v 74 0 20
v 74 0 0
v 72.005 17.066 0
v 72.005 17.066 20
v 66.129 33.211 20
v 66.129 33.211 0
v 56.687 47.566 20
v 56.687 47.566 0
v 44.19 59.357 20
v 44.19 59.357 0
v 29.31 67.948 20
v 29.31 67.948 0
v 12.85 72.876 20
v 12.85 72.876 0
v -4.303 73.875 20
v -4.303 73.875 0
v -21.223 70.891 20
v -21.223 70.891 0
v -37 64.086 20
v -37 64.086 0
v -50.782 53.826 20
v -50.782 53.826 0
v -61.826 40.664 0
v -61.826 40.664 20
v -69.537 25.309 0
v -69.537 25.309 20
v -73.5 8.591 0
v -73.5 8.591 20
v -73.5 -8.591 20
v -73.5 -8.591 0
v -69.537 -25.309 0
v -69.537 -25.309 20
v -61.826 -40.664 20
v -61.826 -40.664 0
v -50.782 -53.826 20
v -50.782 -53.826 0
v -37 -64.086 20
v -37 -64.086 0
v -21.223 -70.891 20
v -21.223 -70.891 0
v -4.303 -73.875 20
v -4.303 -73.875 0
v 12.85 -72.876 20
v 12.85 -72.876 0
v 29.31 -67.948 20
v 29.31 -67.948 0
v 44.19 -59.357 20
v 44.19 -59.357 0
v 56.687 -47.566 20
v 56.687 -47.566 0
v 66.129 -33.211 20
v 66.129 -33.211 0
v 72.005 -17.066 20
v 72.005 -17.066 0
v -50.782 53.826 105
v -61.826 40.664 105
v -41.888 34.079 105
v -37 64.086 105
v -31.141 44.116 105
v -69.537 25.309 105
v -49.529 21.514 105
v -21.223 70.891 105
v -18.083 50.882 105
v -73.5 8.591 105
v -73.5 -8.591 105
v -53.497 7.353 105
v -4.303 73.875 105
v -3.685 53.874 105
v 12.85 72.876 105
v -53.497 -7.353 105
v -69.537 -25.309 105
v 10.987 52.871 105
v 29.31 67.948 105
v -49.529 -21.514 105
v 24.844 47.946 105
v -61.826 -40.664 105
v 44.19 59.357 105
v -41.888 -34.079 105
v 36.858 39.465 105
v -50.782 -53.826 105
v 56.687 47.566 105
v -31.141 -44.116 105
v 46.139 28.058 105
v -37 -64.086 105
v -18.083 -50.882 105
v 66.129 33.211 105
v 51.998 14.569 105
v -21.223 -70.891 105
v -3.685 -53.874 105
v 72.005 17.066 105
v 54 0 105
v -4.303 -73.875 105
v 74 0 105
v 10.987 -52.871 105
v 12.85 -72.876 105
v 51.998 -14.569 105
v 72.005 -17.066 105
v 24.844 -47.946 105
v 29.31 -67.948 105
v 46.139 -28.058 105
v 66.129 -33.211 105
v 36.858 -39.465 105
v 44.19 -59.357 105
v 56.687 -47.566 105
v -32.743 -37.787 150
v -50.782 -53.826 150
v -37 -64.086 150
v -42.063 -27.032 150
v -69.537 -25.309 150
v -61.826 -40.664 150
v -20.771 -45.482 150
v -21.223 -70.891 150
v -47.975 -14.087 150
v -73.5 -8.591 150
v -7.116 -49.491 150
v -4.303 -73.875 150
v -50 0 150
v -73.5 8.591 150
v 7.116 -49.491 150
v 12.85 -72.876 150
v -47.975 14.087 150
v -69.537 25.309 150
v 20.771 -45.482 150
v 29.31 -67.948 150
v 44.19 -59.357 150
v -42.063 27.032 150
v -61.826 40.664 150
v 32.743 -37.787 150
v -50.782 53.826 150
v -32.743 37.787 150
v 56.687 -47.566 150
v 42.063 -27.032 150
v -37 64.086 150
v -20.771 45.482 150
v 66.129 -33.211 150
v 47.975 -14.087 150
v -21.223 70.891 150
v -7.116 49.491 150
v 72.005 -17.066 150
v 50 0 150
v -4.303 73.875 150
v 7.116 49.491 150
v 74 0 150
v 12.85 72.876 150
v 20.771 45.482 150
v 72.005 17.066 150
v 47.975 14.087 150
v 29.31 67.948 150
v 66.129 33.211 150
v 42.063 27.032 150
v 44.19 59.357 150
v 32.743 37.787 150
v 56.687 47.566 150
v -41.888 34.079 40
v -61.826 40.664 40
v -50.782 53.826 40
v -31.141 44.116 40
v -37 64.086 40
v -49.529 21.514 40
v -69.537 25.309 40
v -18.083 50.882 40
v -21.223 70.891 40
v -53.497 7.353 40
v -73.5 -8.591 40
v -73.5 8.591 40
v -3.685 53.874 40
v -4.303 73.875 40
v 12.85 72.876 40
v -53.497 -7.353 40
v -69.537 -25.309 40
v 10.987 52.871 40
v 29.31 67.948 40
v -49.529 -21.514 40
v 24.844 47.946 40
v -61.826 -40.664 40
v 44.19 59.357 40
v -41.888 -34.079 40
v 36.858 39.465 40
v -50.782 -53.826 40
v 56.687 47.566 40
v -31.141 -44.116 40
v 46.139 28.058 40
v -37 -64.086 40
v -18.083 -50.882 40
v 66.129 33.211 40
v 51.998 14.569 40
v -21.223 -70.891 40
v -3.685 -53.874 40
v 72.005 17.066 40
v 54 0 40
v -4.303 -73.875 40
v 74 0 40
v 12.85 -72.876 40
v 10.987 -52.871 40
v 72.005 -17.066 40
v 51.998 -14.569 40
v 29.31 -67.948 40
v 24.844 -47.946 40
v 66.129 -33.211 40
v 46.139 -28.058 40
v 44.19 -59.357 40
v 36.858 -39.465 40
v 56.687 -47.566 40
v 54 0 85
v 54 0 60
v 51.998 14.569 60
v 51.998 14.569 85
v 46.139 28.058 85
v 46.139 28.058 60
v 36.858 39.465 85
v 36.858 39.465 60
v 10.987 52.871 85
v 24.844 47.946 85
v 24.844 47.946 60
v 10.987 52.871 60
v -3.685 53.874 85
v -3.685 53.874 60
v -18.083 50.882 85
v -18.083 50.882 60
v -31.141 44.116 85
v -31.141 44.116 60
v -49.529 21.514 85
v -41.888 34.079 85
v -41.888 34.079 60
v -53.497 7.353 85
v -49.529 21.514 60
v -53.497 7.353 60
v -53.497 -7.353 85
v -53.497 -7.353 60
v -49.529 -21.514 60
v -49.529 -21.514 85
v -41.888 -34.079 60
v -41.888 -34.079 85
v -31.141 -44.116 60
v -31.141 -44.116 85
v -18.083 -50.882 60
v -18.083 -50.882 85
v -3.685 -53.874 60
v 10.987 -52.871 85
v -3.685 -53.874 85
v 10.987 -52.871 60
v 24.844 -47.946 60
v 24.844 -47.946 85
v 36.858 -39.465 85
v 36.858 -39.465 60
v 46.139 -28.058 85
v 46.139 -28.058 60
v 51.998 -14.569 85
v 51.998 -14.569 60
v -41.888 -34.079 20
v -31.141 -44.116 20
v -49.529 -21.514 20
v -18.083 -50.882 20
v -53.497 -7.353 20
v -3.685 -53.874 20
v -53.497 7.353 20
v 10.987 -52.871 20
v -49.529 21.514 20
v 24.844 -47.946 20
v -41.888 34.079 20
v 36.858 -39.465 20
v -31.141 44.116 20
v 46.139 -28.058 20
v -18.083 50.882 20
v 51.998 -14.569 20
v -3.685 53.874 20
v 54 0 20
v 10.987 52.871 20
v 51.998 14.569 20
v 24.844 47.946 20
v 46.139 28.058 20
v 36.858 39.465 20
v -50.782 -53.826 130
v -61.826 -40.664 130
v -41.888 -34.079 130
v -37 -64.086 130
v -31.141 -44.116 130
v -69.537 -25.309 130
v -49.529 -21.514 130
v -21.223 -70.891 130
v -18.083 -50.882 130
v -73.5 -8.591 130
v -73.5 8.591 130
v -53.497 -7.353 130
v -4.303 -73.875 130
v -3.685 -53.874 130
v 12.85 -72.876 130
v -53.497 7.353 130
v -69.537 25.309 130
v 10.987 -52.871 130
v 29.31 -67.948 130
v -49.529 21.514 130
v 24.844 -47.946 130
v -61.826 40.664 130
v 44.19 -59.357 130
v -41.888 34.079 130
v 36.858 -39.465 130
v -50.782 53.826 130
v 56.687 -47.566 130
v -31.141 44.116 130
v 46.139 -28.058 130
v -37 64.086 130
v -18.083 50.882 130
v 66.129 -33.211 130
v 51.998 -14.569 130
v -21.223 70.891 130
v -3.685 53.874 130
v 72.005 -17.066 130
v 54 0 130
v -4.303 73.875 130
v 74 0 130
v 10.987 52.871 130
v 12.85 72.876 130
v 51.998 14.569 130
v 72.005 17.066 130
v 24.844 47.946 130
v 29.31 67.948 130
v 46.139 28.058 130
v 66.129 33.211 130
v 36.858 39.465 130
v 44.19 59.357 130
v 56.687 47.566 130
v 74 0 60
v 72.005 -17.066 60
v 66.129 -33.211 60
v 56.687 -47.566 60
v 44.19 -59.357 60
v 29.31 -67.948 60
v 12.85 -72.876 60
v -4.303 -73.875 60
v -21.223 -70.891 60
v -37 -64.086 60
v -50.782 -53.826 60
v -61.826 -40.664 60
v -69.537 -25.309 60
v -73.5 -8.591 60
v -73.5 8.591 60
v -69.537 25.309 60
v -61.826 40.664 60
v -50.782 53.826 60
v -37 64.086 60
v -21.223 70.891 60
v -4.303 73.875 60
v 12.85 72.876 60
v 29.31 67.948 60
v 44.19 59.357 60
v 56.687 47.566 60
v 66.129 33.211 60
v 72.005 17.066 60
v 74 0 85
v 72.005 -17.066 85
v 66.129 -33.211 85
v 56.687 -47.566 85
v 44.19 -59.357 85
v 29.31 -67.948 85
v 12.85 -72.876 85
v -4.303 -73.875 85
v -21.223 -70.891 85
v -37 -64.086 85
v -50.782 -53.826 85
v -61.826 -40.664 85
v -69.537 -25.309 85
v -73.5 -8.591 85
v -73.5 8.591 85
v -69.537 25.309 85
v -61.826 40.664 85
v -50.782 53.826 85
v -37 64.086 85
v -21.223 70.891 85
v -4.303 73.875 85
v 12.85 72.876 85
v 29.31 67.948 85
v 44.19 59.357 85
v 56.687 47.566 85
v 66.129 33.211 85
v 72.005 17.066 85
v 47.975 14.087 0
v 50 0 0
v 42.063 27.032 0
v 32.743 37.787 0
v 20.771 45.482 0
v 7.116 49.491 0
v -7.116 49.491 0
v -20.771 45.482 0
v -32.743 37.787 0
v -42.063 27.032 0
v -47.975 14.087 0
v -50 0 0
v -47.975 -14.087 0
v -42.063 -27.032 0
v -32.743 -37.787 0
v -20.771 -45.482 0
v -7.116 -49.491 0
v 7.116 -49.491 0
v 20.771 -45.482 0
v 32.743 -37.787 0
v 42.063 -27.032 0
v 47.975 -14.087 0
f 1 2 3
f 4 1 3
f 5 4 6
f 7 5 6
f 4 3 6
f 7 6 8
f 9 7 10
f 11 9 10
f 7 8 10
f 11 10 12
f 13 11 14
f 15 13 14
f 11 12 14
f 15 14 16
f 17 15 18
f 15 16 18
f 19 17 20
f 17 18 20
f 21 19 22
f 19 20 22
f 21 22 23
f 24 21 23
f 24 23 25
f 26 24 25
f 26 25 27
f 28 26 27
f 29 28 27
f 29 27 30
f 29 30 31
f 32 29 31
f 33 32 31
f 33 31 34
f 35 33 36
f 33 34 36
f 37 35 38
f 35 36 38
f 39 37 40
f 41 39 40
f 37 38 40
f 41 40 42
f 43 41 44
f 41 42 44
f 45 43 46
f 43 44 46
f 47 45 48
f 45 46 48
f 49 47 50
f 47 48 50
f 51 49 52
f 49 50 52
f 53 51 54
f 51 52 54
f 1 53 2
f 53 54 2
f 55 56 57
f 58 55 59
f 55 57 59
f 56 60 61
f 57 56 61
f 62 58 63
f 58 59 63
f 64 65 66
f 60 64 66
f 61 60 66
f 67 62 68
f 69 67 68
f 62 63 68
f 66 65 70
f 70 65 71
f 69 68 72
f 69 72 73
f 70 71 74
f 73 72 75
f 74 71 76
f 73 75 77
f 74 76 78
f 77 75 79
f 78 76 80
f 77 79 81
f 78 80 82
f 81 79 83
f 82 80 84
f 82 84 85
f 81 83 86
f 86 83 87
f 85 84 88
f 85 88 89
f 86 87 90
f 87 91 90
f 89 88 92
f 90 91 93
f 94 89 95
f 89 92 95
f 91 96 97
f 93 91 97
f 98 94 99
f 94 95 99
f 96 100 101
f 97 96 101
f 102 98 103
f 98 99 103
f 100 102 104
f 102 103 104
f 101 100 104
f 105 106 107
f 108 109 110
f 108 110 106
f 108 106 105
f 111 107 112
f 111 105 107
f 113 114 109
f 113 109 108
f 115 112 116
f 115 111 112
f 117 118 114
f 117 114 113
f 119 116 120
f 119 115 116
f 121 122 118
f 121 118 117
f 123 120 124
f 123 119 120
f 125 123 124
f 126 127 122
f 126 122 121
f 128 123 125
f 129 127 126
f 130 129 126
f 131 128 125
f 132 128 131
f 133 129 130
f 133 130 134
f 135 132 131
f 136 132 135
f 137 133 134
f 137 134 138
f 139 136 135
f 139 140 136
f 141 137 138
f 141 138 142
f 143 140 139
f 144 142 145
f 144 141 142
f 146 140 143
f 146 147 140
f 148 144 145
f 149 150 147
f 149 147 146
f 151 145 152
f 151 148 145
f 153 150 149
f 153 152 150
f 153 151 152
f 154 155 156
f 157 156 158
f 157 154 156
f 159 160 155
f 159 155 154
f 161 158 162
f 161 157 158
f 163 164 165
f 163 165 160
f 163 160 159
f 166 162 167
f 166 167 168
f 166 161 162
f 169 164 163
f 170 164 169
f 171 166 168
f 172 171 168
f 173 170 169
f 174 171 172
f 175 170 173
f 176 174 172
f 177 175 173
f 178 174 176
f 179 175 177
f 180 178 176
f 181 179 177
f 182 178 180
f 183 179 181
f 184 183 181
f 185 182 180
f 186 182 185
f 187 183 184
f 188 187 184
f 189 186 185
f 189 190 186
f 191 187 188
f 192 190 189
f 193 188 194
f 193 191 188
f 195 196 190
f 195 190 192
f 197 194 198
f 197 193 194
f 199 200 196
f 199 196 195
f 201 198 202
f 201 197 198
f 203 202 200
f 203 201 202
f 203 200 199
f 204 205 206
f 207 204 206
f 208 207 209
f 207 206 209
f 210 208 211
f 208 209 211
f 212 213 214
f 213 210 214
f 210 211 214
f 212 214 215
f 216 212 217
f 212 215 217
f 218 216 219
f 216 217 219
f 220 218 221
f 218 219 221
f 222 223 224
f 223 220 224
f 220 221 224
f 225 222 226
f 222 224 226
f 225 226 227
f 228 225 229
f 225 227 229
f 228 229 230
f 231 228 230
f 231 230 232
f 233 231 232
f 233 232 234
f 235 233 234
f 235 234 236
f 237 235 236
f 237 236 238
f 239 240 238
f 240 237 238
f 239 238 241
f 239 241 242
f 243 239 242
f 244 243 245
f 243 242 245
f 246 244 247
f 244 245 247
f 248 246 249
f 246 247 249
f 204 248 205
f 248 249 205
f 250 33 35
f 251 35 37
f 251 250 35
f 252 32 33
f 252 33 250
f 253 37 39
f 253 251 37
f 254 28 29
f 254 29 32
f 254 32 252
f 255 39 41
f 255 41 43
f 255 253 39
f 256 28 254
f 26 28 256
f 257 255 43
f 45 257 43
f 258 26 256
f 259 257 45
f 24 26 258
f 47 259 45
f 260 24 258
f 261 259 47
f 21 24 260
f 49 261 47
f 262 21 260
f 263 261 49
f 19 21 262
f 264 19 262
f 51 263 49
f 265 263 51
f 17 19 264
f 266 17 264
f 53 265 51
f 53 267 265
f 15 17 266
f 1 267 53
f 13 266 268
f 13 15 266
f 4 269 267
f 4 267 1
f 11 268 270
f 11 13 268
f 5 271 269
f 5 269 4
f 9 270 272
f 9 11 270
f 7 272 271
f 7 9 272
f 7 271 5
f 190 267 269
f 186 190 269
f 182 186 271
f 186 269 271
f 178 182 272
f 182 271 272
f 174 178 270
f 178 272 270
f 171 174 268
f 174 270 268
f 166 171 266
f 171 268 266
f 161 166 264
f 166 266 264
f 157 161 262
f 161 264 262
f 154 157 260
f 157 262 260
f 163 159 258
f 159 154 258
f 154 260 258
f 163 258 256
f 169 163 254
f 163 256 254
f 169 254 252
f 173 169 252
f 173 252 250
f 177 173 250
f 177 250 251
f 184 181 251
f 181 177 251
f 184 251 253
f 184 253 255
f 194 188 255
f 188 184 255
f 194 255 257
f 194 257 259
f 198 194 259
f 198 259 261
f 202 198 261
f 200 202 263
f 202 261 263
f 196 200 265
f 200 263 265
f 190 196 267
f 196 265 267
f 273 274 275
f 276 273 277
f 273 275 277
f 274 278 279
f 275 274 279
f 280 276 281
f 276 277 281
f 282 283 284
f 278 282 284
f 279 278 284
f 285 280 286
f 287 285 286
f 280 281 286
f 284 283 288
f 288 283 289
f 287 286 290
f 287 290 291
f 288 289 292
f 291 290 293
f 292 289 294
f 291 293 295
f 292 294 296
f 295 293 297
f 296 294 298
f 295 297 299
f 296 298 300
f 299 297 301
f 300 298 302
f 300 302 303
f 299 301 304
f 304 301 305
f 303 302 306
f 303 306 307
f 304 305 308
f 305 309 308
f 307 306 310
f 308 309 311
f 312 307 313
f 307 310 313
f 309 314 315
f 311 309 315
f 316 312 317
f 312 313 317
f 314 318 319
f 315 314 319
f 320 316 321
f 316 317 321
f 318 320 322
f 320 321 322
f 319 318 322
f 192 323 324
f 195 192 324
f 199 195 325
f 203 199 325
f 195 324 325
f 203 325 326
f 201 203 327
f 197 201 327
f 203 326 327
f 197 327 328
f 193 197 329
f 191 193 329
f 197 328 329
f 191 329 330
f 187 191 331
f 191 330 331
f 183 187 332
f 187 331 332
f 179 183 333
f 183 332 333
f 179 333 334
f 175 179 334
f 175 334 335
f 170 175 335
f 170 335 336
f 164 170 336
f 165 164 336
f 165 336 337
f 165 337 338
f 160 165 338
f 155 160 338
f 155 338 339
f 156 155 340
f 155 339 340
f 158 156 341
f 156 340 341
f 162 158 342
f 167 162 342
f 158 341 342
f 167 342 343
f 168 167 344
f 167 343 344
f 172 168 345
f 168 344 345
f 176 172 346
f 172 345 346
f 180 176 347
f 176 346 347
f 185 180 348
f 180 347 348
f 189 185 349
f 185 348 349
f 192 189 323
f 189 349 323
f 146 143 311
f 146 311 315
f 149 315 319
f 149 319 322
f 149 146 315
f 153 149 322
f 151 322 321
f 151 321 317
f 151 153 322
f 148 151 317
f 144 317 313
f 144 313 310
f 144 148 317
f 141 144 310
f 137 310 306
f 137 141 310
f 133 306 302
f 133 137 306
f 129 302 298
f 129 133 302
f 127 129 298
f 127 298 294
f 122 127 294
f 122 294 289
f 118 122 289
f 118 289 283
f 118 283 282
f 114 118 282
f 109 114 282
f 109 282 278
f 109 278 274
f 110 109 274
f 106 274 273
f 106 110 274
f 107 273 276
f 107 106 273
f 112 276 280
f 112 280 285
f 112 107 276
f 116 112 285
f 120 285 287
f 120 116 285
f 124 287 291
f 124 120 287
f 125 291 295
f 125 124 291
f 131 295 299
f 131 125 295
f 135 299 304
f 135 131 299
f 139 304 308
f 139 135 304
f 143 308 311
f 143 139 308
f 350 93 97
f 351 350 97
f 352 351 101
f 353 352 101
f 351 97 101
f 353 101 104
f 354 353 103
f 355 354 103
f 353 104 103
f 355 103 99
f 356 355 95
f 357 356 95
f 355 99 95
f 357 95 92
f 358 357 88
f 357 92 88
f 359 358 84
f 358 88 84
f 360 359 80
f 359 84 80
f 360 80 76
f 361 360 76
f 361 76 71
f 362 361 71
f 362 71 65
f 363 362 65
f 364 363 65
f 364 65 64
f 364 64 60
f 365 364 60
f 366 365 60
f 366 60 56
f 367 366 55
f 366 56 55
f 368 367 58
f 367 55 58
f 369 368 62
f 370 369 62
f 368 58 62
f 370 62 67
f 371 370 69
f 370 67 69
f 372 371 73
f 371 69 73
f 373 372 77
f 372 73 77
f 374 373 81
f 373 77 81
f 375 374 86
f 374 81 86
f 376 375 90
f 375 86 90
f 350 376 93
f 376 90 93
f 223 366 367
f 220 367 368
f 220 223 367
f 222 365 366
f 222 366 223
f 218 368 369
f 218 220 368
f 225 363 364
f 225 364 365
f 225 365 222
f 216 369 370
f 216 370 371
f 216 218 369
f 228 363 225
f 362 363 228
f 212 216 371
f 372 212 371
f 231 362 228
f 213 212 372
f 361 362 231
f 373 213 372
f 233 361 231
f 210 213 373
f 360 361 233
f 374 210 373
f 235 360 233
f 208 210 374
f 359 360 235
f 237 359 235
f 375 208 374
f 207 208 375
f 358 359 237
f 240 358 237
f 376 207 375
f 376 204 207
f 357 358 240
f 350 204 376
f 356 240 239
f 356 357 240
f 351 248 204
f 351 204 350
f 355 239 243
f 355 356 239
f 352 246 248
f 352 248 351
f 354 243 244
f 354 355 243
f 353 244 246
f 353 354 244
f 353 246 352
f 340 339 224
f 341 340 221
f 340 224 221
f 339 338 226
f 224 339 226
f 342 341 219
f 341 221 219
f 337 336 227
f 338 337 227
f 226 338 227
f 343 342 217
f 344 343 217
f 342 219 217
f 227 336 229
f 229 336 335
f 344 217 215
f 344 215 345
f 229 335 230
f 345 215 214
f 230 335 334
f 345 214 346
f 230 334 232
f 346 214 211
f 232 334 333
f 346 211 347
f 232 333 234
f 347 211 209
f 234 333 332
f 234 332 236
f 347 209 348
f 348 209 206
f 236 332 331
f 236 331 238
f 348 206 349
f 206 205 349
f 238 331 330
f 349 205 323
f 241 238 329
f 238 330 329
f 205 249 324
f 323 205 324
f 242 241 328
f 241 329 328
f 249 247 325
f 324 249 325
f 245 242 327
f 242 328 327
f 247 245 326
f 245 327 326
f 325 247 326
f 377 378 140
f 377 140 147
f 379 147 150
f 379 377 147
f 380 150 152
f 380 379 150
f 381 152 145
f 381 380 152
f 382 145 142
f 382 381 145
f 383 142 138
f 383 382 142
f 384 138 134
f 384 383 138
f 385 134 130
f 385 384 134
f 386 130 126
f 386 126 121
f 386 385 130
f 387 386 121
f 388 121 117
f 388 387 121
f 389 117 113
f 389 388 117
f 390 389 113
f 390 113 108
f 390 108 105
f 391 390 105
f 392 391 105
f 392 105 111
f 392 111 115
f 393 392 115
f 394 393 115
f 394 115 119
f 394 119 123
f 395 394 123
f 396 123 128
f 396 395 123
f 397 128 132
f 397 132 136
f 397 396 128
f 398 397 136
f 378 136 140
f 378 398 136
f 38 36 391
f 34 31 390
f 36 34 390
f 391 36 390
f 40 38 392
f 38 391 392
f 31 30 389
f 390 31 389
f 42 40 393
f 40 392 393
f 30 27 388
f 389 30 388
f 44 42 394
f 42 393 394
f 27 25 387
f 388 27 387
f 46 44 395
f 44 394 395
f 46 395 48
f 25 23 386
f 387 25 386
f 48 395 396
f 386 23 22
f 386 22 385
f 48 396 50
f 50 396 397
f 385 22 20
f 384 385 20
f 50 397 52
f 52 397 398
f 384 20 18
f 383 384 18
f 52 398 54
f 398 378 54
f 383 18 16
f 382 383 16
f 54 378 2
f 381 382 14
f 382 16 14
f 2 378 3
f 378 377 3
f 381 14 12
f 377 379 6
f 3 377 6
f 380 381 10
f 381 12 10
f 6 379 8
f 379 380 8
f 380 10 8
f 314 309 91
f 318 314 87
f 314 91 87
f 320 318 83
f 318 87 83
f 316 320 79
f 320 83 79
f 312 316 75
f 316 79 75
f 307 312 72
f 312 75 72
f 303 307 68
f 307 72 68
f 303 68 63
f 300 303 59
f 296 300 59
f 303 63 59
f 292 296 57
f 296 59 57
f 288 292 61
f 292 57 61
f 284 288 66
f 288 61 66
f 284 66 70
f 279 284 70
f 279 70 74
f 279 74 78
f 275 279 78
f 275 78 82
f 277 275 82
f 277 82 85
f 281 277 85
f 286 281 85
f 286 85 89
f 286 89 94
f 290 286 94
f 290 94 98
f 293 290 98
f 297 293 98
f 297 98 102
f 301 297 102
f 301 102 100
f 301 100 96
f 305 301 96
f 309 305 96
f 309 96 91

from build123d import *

# Parameters (mm, degrees)
F0_R      = 54
F0_R_2    = 50
F1_DEPTH  = 150
F2_R      = 74
F2_R_2    = 54
F3_DEPTH  = 20
F4_R      = 74
F4_R_2    = 54
F5_DEPTH  = 20
F7_R      = 74
F7_R_2    = 54
F8_DEPTH  = 20
F10_R     = 74
F10_R_2   = 54
F11_DEPTH = 20


with BuildPart() as f1:
    # F0 (on Top) → F1 (new body)
    with BuildSketch(Plane.XY):
        Circle(F0_R)
        Circle(F0_R_2, mode=Mode.SUBTRACT)
    extrude(amount=F1_DEPTH)

    # F2 (on Top) → F3 (join)
    with BuildSketch(Plane.XY):
        Circle(F2_R)
        Circle(F2_R_2, mode=Mode.SUBTRACT)
    extrude(amount=F3_DEPTH)

    # F4 (on face) → F5 (join)
    with BuildSketch(Plane.XY.offset(150)):
        Circle(F4_R)
        Circle(F4_R_2, mode=Mode.SUBTRACT)
    extrude(amount=-F5_DEPTH)

    # F7 (on offset) → F8 (join)
    with BuildSketch(Plane(origin=(0, 0, 105), x_dir=(1, 0, 0), z_dir=(0, 0, -1))):
        Circle(F7_R)
        Circle(F7_R_2, mode=Mode.SUBTRACT)
    extrude(amount=F8_DEPTH)

    # F10 (on offset) → F11 (join)
    with BuildSketch(Plane(origin=(0, 0, 60), x_dir=(1, 0, 0), z_dir=(0, 0, -1))):
        Circle(F10_R)
        Circle(F10_R_2, mode=Mode.SUBTRACT)
    extrude(amount=F11_DEPTH)


solid = f1.part
